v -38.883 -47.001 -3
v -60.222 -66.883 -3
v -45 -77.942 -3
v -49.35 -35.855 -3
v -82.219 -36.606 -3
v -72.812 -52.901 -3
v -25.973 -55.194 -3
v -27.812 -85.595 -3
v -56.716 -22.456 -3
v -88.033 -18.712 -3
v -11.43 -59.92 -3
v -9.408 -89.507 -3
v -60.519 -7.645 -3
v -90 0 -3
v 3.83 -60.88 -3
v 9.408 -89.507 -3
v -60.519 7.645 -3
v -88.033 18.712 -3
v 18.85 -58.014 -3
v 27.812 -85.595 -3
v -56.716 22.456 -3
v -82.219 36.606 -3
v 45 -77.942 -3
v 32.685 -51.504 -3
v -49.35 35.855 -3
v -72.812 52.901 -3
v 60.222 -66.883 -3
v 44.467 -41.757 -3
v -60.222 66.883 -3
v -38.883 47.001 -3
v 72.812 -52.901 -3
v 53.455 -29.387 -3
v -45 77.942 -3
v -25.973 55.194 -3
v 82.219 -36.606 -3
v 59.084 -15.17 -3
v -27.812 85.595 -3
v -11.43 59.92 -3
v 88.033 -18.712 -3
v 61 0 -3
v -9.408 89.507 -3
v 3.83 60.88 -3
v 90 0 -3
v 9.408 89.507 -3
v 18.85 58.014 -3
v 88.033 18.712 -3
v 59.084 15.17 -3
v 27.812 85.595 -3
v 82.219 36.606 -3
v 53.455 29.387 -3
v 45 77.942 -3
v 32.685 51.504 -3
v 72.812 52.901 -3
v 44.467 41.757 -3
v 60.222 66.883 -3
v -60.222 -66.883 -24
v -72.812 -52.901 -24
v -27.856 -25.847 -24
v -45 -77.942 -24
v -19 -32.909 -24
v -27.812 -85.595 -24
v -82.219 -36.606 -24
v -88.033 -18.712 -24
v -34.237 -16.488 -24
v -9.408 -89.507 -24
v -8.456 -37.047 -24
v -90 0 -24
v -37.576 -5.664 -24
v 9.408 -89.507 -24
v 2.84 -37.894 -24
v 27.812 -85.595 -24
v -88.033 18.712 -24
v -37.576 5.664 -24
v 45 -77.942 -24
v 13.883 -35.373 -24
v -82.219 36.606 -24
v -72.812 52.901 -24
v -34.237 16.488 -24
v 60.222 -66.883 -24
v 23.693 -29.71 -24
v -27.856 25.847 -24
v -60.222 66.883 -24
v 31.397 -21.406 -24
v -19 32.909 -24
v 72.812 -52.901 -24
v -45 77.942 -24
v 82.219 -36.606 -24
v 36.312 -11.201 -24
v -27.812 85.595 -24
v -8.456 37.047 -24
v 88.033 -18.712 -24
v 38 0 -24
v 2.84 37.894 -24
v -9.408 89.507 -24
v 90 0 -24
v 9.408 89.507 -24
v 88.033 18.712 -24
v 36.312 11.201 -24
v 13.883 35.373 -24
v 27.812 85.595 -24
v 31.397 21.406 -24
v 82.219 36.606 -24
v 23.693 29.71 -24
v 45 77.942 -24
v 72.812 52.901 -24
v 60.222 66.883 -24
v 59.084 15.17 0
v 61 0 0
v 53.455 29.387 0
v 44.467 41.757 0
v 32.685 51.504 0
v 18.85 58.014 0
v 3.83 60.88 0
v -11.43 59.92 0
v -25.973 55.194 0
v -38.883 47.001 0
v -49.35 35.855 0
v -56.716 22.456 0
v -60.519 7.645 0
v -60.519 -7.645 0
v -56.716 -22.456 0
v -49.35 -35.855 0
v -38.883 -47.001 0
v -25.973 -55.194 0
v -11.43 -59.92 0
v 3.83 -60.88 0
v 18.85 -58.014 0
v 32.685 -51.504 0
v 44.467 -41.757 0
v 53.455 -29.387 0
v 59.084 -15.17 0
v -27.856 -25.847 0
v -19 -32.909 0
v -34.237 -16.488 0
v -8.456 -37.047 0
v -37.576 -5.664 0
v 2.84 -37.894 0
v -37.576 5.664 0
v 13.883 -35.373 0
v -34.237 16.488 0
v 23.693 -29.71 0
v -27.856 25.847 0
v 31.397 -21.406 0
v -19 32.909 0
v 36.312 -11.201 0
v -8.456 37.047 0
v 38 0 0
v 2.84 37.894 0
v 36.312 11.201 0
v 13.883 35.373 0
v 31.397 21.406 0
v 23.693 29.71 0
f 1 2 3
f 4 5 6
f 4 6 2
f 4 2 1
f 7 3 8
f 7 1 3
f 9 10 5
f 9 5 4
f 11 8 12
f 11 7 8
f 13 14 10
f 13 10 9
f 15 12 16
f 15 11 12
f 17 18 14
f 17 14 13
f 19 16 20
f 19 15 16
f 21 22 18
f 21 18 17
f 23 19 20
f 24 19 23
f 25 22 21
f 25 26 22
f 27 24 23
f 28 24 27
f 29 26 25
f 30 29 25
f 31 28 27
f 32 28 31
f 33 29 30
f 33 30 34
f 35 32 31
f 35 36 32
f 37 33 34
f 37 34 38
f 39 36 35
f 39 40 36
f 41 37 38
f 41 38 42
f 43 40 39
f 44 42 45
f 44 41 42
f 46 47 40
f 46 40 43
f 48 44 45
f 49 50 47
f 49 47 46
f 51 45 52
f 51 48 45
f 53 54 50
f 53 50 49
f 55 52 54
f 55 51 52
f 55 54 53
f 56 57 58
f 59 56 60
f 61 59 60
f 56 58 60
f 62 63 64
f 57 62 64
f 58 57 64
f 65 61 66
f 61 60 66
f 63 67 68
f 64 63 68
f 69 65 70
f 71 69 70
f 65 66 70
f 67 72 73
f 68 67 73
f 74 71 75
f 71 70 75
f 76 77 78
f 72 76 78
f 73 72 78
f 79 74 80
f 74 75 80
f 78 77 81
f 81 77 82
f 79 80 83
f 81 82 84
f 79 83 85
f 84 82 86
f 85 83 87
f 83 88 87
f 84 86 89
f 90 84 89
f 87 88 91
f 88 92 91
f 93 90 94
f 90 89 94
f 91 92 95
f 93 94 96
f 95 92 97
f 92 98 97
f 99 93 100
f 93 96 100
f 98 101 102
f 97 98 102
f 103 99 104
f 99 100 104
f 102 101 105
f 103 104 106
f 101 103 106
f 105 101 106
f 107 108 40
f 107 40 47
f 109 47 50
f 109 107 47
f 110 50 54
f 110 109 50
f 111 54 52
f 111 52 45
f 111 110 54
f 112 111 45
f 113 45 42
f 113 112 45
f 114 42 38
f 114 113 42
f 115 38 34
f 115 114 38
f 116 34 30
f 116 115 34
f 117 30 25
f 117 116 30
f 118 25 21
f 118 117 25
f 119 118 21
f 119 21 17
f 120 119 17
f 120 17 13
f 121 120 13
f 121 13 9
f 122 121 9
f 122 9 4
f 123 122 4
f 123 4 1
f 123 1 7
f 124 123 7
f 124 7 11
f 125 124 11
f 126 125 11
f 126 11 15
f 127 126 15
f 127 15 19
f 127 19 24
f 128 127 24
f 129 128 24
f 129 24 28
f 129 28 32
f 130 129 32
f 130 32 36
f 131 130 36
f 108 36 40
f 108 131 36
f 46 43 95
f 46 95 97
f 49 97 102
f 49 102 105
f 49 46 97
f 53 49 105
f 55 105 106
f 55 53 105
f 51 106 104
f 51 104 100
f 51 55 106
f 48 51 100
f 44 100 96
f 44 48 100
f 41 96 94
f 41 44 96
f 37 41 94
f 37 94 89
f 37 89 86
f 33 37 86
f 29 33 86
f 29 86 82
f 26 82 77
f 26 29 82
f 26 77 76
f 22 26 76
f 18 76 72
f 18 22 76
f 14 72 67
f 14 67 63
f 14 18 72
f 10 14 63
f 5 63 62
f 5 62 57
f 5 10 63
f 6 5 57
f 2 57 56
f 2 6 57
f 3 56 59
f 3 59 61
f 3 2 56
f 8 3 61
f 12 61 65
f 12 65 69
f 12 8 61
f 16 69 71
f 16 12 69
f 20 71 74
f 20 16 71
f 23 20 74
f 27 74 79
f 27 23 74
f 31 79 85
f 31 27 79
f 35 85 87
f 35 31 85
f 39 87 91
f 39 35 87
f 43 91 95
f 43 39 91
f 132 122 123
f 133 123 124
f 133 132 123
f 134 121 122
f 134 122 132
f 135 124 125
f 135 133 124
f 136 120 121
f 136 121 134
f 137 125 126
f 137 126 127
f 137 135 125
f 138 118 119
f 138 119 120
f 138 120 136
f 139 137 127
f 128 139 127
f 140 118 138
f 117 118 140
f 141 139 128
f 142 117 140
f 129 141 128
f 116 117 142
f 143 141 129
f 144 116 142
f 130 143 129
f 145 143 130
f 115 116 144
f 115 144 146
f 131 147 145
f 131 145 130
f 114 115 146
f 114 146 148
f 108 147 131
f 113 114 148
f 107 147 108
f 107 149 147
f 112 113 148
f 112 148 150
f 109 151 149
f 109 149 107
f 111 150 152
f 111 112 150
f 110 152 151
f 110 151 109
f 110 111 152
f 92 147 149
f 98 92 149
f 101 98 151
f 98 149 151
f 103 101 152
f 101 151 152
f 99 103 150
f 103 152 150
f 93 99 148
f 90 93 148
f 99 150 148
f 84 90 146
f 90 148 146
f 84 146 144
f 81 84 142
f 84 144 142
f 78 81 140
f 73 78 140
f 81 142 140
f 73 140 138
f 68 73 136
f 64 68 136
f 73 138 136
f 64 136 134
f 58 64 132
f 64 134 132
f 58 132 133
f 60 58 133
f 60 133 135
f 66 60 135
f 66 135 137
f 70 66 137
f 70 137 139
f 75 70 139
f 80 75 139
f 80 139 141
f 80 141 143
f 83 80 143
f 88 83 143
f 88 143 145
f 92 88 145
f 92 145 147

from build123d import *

# Parameters (mm, degrees)
HUB_DIAMETER_R      = 61
HUB_DEPTH           = 24
FLANGE_DIAMETER_R   = 90
FLANGE_DEPTH        = 21
SKETCH_1_R          = 38
CUT_EXTRUDE_1_DEPTH = 130.52219887


with BuildPart() as part:
    # Hub Diameter → Hub (new body)
    with BuildSketch(Plane.XY):
        Circle(HUB_DIAMETER_R)
    extrude(amount=-HUB_DEPTH)

    # Flange Diameter → Flange (add)
    with BuildSketch(Plane.XY.offset(-3)):
        Circle(FLANGE_DIAMETER_R)
    extrude(amount=-FLANGE_DEPTH)

    # Эскиз1 → Вырез-Вытянуть1 (cut, through all)
    with BuildSketch(Plane.XY):
        Circle(SKETCH_1_R)
    extrude(amount=-CUT_EXTRUDE_1_DEPTH, mode=Mode.SUBTRACT)


solid = part.part
